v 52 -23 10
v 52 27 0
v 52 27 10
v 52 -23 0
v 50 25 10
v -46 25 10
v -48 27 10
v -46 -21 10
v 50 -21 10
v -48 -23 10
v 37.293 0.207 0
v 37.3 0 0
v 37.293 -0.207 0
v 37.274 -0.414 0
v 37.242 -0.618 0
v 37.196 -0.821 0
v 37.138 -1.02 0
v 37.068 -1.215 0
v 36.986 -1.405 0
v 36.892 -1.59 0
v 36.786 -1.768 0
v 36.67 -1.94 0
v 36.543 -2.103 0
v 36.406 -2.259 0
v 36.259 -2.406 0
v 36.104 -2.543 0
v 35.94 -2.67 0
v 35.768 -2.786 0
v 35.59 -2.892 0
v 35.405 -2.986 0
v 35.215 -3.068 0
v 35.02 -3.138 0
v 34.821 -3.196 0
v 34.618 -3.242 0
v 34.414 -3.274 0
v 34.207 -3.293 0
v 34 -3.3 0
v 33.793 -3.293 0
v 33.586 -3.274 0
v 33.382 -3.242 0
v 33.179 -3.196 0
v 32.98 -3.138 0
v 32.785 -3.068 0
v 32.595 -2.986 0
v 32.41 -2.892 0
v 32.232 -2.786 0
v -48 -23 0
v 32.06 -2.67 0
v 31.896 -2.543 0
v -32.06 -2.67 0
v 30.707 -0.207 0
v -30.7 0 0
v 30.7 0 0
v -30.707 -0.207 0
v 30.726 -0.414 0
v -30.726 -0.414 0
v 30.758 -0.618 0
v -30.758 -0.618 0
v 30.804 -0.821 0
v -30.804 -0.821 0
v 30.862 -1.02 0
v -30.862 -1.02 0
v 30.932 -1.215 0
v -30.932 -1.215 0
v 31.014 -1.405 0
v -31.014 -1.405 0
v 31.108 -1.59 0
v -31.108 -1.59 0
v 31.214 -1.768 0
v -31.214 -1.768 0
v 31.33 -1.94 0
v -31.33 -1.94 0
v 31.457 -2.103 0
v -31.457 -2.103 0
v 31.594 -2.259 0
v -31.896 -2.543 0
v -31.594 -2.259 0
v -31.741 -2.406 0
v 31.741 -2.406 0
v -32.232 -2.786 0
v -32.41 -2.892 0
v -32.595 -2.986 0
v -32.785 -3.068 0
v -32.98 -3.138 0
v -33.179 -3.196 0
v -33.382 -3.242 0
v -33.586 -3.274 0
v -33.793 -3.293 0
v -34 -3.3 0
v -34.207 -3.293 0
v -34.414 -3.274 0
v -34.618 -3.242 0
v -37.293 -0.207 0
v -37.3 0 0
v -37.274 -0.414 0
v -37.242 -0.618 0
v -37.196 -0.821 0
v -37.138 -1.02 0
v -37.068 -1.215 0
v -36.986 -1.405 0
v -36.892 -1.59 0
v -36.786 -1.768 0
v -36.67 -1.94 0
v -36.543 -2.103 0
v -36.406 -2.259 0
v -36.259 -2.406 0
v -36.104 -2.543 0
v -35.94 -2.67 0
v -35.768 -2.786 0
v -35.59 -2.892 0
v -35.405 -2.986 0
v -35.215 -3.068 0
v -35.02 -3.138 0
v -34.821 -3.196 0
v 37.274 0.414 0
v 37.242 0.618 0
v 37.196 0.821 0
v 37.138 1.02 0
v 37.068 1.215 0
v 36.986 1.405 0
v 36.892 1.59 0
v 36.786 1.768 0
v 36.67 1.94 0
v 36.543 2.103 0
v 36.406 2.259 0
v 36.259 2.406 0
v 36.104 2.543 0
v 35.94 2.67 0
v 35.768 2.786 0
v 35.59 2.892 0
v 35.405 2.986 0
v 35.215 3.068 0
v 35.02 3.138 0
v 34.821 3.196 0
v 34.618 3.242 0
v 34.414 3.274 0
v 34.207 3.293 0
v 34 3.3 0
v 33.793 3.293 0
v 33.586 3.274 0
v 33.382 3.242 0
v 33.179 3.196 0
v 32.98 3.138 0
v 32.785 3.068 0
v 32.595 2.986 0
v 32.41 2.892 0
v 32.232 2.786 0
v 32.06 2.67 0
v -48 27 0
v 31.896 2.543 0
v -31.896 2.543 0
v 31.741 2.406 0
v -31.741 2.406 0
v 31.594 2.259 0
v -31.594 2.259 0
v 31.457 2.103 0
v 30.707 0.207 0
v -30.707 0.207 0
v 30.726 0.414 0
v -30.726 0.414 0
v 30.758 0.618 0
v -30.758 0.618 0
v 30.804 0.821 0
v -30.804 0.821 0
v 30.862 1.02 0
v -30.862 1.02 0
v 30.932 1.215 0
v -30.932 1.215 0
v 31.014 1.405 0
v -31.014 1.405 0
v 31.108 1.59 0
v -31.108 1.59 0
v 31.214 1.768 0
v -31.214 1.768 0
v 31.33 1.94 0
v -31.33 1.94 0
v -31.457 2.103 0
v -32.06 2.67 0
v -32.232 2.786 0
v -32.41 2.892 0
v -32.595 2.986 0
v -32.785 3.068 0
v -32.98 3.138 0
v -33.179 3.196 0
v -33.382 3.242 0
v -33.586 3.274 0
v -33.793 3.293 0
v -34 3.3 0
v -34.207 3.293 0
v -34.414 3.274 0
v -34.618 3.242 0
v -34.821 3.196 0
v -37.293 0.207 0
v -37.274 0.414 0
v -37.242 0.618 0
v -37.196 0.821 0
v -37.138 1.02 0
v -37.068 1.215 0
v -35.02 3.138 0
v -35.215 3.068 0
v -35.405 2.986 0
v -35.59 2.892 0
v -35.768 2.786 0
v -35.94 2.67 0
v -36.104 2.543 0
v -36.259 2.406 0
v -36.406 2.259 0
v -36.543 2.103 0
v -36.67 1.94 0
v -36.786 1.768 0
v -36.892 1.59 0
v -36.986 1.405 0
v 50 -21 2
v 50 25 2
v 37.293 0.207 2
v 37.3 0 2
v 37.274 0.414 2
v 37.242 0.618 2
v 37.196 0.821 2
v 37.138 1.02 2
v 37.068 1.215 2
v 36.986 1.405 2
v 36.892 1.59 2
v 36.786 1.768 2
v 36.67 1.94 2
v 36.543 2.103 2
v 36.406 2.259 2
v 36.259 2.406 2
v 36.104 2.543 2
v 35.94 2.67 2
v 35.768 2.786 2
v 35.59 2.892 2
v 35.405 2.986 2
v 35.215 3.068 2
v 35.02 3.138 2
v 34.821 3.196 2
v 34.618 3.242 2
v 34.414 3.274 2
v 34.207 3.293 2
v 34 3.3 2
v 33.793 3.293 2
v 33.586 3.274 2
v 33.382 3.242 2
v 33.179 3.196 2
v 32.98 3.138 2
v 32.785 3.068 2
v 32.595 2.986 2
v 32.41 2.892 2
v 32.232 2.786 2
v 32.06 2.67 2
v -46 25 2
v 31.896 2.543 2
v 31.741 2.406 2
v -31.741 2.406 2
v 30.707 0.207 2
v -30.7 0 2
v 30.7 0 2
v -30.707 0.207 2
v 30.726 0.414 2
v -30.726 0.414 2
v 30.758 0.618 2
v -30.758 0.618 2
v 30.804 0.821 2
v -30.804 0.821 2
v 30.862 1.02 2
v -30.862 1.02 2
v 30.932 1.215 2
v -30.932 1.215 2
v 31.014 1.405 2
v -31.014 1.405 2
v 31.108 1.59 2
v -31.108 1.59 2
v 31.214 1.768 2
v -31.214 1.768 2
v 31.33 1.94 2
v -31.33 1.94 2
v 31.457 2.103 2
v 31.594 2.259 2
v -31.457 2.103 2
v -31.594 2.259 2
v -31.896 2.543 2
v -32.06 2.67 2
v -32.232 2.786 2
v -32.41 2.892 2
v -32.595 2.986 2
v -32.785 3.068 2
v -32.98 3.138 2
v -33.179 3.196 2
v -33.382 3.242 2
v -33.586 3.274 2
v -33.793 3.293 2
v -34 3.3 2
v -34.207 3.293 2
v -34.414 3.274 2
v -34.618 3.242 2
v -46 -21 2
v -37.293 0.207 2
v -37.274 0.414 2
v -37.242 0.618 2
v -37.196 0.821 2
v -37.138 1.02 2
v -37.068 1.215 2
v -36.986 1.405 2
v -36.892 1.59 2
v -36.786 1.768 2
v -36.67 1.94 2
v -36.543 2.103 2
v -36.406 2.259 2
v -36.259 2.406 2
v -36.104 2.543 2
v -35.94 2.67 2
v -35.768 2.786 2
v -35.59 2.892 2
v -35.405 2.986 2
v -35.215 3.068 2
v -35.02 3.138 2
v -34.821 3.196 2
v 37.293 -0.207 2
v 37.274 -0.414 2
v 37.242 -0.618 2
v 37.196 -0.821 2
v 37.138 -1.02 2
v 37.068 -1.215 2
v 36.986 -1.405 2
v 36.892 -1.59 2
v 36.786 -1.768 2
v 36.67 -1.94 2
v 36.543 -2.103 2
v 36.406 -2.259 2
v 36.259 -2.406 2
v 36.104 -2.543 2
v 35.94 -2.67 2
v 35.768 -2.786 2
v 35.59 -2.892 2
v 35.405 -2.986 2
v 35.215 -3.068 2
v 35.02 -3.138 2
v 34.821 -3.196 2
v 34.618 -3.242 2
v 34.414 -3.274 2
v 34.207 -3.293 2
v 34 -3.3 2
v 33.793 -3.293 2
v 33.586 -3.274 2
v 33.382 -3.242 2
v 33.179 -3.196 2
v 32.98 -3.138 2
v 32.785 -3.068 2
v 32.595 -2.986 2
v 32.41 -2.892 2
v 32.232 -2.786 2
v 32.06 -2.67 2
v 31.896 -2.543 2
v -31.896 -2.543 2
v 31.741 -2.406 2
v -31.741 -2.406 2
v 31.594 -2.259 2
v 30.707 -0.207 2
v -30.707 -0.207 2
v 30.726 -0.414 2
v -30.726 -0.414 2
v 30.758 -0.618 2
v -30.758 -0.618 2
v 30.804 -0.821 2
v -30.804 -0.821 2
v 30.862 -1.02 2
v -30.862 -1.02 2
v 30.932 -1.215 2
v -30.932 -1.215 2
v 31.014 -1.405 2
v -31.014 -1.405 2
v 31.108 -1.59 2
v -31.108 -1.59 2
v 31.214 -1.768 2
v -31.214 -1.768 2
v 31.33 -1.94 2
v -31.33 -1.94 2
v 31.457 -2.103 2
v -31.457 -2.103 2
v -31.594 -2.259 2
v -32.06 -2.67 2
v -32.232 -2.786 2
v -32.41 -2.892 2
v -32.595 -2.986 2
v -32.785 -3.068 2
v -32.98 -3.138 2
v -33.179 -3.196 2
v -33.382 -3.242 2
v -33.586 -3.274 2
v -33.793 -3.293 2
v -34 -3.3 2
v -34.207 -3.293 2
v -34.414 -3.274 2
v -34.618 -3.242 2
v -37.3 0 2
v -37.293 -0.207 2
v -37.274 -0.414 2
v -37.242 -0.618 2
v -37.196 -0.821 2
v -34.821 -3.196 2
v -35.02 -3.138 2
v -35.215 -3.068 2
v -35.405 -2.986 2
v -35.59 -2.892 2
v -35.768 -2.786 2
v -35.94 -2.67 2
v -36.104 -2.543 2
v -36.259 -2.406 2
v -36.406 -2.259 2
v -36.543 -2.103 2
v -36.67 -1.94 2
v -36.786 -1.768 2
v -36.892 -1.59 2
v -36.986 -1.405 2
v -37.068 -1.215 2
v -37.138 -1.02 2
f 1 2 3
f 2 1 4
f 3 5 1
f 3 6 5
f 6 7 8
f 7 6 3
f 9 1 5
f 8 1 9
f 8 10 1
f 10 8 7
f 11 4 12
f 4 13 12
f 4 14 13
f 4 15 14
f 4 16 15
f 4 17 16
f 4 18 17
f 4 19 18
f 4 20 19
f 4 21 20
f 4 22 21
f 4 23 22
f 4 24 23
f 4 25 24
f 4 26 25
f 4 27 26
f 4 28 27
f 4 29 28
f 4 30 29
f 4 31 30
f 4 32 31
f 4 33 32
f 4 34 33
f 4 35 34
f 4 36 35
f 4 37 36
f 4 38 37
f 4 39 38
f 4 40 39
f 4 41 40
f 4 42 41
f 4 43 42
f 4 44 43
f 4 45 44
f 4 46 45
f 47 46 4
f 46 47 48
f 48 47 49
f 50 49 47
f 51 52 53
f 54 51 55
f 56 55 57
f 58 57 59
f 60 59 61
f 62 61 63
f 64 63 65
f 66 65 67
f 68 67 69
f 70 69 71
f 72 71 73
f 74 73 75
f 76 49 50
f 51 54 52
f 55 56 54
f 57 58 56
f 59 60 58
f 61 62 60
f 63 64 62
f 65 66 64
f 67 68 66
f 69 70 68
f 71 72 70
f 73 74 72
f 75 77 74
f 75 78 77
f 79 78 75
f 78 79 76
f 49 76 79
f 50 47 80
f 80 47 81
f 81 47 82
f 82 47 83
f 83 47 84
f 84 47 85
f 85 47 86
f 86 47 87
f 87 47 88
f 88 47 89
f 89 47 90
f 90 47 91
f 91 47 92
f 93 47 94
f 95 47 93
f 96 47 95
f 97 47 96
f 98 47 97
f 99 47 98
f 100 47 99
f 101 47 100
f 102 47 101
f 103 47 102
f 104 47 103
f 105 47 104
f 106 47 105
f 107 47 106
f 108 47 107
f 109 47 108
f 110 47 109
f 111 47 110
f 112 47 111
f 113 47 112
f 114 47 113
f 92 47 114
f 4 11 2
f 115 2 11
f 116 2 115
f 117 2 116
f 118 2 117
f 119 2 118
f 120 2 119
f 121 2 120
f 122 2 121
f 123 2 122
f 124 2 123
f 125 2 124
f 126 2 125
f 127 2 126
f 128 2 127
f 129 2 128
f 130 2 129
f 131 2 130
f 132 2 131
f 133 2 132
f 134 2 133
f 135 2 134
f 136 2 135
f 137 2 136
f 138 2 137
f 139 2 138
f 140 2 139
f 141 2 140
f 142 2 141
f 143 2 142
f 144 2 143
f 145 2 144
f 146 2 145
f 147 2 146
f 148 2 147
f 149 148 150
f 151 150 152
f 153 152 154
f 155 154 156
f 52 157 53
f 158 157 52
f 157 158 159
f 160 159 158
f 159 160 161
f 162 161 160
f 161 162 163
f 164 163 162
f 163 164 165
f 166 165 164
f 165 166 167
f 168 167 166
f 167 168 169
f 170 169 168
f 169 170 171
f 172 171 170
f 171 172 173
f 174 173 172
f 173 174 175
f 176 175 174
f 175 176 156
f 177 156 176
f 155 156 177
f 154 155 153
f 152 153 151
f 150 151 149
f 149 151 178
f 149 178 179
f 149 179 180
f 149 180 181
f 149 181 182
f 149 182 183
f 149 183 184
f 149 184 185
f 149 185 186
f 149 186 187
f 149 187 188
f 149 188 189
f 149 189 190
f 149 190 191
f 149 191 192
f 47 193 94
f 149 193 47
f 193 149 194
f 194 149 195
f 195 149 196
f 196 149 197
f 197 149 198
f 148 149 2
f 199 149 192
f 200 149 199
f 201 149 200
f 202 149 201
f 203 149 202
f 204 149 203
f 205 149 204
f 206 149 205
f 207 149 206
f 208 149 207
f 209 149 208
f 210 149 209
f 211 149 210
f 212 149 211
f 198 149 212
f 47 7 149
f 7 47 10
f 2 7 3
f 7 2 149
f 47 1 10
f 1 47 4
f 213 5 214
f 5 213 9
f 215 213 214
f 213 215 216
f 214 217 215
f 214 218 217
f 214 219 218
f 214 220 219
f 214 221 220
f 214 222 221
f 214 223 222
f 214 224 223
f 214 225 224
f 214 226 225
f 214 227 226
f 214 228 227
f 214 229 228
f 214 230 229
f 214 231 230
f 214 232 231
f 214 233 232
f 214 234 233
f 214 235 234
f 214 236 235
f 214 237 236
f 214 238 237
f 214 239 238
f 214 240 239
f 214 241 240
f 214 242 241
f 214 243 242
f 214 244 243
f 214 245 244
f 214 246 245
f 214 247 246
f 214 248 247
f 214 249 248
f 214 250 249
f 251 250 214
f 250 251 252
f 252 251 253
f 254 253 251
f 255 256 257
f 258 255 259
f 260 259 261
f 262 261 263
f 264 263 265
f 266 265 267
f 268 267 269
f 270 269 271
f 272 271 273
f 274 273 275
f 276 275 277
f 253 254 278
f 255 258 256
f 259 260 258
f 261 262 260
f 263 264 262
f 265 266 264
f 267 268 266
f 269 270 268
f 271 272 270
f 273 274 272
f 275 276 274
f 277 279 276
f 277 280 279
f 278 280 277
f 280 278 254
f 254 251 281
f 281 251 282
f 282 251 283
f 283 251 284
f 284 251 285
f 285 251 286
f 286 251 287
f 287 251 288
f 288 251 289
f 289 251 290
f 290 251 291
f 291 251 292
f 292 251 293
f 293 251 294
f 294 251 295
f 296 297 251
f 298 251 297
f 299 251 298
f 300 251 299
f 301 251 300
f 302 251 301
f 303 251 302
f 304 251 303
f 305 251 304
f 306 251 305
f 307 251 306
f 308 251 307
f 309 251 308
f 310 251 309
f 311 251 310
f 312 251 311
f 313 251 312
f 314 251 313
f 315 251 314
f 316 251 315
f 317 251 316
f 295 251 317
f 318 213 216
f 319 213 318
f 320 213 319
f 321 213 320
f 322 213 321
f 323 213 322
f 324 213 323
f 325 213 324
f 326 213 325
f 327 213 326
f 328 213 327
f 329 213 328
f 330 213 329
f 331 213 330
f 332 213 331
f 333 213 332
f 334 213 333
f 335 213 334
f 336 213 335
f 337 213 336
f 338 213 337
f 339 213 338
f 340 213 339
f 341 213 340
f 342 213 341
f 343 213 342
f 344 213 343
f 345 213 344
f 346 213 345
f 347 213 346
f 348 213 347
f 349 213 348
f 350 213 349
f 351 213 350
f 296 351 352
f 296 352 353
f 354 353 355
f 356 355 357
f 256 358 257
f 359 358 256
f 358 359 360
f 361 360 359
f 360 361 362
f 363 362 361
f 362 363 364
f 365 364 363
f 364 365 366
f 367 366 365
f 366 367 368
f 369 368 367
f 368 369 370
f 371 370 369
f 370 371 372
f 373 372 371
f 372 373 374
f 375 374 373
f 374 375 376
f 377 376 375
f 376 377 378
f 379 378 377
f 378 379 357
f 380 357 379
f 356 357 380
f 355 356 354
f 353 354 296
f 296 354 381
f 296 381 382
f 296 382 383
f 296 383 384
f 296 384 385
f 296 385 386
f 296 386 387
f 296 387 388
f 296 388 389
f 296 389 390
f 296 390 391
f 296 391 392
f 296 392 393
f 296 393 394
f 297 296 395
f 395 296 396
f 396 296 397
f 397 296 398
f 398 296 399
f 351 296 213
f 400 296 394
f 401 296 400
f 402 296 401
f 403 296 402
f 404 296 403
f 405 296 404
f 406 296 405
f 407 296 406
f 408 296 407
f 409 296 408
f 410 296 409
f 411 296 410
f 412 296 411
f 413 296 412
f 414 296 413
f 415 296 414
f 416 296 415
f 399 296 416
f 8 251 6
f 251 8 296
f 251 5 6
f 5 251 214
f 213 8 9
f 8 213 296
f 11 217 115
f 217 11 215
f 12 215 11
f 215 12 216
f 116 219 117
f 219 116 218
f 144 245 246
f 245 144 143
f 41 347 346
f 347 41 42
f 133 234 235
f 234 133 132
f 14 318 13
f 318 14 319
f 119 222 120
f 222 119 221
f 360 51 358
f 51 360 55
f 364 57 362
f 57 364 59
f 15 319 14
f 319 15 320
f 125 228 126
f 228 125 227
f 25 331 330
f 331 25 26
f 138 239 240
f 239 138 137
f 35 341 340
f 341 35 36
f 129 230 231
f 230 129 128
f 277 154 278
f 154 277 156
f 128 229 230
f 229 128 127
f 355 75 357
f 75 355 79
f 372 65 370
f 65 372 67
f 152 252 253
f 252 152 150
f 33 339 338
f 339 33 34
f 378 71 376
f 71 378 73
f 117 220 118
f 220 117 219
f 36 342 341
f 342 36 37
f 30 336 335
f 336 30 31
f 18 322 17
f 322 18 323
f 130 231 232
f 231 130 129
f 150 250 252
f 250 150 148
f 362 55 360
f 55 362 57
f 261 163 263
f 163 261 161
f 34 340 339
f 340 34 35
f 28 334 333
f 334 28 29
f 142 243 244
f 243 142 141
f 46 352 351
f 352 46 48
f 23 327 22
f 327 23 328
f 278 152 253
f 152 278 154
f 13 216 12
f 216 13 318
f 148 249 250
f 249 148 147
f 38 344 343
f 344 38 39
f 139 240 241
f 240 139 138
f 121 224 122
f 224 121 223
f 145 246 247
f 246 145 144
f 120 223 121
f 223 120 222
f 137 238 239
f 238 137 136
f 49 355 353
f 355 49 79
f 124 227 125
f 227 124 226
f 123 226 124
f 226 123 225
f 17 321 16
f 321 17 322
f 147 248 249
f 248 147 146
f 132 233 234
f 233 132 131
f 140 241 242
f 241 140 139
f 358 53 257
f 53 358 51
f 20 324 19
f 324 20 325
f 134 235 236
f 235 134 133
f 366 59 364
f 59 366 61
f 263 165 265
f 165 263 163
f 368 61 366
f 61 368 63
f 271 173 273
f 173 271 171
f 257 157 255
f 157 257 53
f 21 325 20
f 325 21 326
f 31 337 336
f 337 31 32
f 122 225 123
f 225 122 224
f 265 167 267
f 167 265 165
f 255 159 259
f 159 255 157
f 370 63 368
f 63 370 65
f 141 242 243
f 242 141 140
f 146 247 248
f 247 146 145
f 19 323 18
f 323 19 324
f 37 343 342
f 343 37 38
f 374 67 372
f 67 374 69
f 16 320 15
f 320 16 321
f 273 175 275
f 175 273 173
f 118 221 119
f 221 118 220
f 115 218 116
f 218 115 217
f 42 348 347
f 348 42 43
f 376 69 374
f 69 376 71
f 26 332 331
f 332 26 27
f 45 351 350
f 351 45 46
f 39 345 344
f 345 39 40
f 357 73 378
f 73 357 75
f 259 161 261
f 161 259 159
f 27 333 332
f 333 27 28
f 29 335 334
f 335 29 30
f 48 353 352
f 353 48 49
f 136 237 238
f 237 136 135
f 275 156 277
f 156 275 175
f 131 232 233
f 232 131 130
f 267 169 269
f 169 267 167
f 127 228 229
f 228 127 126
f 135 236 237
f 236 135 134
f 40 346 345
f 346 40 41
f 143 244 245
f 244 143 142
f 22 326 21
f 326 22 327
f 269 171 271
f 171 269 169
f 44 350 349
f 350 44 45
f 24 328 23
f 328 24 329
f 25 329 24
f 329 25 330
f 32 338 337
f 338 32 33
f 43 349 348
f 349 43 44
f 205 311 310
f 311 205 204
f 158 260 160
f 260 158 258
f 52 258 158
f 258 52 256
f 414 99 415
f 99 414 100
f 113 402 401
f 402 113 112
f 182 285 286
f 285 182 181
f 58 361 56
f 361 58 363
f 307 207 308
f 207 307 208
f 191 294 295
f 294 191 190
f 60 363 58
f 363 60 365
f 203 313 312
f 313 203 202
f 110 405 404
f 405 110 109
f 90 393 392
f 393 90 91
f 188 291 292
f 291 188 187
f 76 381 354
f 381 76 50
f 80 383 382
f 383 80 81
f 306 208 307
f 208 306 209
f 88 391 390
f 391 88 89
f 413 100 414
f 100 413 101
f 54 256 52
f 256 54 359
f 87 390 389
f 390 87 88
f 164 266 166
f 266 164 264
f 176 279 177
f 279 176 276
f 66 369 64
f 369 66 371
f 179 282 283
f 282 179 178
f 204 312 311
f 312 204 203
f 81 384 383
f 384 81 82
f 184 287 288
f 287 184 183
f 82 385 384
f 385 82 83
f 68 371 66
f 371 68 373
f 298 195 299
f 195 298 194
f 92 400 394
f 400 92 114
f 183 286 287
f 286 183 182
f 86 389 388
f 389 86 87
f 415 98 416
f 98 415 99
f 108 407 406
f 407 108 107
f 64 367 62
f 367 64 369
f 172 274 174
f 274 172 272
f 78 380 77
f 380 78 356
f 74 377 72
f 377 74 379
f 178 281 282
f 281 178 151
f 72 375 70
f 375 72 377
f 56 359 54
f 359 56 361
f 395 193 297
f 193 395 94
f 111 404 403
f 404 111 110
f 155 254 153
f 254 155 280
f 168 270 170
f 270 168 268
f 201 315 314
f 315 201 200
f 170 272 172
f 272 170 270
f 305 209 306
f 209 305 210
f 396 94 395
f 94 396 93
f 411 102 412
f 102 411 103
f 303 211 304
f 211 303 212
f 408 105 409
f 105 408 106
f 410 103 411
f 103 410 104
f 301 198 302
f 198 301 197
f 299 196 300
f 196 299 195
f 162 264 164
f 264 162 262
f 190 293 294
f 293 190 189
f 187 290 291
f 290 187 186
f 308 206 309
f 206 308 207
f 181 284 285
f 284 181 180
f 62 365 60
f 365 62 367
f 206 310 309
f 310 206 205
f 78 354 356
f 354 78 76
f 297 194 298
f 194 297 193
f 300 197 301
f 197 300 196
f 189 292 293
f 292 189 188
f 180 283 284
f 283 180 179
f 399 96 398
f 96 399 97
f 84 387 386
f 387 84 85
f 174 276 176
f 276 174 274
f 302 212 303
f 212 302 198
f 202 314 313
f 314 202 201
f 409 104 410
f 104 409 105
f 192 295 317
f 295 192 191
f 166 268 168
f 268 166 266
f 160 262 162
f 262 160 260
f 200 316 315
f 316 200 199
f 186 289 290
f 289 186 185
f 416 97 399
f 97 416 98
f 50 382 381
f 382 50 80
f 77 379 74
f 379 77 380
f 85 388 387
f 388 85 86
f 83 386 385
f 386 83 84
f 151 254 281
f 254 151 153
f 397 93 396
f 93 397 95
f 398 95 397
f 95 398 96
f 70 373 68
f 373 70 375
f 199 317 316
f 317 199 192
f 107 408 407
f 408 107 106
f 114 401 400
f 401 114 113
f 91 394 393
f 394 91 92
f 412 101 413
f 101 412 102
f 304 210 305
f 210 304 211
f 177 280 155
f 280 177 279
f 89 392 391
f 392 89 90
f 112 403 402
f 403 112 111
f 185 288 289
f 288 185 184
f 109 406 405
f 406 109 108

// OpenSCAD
module pie() {
    difference(){
        cylinder(d = 150, h = 10, center = false, $fn = 100);
        translate([68/2,0,3.1]) cylinder(d = 6.6, h = 7, center = false, $fn = 100);
        translate([-68/2,0,3.1]) cylinder(d = 6.6, h = 7, center = false, $fn = 100);
    }
}

module pie2() {
    difference(){
        cylinder(d = 150, h = 10, center = false, $fn = 100);
        translate([0,0,2]) cylinder(d = 146, h = 10, center = false, $fn = 100);
        translate([68/2,0,-0.001]) cylinder(d = 6.6, h = 5, center = false, $fn = 100);
        translate([-68/2,0,-0.001]) cylinder(d = 6.6, h = 5, center = false, $fn = 100);
    }
}

module pie3() {
    difference(){
        translate([2,2,5]) cube([100, 50, 10], center = true);
        translate([2,2,7]) cube([96, 46, 10], center = true);
        translate([68/2,0,-0.001]) cylinder(d = 6.6, h = 5, center = false, $fn = 100);
        translate([-68/2,0,-0.001]) cylinder(d = 6.6, h = 5, center = false, $fn = 100);
    }
}

pie3();
